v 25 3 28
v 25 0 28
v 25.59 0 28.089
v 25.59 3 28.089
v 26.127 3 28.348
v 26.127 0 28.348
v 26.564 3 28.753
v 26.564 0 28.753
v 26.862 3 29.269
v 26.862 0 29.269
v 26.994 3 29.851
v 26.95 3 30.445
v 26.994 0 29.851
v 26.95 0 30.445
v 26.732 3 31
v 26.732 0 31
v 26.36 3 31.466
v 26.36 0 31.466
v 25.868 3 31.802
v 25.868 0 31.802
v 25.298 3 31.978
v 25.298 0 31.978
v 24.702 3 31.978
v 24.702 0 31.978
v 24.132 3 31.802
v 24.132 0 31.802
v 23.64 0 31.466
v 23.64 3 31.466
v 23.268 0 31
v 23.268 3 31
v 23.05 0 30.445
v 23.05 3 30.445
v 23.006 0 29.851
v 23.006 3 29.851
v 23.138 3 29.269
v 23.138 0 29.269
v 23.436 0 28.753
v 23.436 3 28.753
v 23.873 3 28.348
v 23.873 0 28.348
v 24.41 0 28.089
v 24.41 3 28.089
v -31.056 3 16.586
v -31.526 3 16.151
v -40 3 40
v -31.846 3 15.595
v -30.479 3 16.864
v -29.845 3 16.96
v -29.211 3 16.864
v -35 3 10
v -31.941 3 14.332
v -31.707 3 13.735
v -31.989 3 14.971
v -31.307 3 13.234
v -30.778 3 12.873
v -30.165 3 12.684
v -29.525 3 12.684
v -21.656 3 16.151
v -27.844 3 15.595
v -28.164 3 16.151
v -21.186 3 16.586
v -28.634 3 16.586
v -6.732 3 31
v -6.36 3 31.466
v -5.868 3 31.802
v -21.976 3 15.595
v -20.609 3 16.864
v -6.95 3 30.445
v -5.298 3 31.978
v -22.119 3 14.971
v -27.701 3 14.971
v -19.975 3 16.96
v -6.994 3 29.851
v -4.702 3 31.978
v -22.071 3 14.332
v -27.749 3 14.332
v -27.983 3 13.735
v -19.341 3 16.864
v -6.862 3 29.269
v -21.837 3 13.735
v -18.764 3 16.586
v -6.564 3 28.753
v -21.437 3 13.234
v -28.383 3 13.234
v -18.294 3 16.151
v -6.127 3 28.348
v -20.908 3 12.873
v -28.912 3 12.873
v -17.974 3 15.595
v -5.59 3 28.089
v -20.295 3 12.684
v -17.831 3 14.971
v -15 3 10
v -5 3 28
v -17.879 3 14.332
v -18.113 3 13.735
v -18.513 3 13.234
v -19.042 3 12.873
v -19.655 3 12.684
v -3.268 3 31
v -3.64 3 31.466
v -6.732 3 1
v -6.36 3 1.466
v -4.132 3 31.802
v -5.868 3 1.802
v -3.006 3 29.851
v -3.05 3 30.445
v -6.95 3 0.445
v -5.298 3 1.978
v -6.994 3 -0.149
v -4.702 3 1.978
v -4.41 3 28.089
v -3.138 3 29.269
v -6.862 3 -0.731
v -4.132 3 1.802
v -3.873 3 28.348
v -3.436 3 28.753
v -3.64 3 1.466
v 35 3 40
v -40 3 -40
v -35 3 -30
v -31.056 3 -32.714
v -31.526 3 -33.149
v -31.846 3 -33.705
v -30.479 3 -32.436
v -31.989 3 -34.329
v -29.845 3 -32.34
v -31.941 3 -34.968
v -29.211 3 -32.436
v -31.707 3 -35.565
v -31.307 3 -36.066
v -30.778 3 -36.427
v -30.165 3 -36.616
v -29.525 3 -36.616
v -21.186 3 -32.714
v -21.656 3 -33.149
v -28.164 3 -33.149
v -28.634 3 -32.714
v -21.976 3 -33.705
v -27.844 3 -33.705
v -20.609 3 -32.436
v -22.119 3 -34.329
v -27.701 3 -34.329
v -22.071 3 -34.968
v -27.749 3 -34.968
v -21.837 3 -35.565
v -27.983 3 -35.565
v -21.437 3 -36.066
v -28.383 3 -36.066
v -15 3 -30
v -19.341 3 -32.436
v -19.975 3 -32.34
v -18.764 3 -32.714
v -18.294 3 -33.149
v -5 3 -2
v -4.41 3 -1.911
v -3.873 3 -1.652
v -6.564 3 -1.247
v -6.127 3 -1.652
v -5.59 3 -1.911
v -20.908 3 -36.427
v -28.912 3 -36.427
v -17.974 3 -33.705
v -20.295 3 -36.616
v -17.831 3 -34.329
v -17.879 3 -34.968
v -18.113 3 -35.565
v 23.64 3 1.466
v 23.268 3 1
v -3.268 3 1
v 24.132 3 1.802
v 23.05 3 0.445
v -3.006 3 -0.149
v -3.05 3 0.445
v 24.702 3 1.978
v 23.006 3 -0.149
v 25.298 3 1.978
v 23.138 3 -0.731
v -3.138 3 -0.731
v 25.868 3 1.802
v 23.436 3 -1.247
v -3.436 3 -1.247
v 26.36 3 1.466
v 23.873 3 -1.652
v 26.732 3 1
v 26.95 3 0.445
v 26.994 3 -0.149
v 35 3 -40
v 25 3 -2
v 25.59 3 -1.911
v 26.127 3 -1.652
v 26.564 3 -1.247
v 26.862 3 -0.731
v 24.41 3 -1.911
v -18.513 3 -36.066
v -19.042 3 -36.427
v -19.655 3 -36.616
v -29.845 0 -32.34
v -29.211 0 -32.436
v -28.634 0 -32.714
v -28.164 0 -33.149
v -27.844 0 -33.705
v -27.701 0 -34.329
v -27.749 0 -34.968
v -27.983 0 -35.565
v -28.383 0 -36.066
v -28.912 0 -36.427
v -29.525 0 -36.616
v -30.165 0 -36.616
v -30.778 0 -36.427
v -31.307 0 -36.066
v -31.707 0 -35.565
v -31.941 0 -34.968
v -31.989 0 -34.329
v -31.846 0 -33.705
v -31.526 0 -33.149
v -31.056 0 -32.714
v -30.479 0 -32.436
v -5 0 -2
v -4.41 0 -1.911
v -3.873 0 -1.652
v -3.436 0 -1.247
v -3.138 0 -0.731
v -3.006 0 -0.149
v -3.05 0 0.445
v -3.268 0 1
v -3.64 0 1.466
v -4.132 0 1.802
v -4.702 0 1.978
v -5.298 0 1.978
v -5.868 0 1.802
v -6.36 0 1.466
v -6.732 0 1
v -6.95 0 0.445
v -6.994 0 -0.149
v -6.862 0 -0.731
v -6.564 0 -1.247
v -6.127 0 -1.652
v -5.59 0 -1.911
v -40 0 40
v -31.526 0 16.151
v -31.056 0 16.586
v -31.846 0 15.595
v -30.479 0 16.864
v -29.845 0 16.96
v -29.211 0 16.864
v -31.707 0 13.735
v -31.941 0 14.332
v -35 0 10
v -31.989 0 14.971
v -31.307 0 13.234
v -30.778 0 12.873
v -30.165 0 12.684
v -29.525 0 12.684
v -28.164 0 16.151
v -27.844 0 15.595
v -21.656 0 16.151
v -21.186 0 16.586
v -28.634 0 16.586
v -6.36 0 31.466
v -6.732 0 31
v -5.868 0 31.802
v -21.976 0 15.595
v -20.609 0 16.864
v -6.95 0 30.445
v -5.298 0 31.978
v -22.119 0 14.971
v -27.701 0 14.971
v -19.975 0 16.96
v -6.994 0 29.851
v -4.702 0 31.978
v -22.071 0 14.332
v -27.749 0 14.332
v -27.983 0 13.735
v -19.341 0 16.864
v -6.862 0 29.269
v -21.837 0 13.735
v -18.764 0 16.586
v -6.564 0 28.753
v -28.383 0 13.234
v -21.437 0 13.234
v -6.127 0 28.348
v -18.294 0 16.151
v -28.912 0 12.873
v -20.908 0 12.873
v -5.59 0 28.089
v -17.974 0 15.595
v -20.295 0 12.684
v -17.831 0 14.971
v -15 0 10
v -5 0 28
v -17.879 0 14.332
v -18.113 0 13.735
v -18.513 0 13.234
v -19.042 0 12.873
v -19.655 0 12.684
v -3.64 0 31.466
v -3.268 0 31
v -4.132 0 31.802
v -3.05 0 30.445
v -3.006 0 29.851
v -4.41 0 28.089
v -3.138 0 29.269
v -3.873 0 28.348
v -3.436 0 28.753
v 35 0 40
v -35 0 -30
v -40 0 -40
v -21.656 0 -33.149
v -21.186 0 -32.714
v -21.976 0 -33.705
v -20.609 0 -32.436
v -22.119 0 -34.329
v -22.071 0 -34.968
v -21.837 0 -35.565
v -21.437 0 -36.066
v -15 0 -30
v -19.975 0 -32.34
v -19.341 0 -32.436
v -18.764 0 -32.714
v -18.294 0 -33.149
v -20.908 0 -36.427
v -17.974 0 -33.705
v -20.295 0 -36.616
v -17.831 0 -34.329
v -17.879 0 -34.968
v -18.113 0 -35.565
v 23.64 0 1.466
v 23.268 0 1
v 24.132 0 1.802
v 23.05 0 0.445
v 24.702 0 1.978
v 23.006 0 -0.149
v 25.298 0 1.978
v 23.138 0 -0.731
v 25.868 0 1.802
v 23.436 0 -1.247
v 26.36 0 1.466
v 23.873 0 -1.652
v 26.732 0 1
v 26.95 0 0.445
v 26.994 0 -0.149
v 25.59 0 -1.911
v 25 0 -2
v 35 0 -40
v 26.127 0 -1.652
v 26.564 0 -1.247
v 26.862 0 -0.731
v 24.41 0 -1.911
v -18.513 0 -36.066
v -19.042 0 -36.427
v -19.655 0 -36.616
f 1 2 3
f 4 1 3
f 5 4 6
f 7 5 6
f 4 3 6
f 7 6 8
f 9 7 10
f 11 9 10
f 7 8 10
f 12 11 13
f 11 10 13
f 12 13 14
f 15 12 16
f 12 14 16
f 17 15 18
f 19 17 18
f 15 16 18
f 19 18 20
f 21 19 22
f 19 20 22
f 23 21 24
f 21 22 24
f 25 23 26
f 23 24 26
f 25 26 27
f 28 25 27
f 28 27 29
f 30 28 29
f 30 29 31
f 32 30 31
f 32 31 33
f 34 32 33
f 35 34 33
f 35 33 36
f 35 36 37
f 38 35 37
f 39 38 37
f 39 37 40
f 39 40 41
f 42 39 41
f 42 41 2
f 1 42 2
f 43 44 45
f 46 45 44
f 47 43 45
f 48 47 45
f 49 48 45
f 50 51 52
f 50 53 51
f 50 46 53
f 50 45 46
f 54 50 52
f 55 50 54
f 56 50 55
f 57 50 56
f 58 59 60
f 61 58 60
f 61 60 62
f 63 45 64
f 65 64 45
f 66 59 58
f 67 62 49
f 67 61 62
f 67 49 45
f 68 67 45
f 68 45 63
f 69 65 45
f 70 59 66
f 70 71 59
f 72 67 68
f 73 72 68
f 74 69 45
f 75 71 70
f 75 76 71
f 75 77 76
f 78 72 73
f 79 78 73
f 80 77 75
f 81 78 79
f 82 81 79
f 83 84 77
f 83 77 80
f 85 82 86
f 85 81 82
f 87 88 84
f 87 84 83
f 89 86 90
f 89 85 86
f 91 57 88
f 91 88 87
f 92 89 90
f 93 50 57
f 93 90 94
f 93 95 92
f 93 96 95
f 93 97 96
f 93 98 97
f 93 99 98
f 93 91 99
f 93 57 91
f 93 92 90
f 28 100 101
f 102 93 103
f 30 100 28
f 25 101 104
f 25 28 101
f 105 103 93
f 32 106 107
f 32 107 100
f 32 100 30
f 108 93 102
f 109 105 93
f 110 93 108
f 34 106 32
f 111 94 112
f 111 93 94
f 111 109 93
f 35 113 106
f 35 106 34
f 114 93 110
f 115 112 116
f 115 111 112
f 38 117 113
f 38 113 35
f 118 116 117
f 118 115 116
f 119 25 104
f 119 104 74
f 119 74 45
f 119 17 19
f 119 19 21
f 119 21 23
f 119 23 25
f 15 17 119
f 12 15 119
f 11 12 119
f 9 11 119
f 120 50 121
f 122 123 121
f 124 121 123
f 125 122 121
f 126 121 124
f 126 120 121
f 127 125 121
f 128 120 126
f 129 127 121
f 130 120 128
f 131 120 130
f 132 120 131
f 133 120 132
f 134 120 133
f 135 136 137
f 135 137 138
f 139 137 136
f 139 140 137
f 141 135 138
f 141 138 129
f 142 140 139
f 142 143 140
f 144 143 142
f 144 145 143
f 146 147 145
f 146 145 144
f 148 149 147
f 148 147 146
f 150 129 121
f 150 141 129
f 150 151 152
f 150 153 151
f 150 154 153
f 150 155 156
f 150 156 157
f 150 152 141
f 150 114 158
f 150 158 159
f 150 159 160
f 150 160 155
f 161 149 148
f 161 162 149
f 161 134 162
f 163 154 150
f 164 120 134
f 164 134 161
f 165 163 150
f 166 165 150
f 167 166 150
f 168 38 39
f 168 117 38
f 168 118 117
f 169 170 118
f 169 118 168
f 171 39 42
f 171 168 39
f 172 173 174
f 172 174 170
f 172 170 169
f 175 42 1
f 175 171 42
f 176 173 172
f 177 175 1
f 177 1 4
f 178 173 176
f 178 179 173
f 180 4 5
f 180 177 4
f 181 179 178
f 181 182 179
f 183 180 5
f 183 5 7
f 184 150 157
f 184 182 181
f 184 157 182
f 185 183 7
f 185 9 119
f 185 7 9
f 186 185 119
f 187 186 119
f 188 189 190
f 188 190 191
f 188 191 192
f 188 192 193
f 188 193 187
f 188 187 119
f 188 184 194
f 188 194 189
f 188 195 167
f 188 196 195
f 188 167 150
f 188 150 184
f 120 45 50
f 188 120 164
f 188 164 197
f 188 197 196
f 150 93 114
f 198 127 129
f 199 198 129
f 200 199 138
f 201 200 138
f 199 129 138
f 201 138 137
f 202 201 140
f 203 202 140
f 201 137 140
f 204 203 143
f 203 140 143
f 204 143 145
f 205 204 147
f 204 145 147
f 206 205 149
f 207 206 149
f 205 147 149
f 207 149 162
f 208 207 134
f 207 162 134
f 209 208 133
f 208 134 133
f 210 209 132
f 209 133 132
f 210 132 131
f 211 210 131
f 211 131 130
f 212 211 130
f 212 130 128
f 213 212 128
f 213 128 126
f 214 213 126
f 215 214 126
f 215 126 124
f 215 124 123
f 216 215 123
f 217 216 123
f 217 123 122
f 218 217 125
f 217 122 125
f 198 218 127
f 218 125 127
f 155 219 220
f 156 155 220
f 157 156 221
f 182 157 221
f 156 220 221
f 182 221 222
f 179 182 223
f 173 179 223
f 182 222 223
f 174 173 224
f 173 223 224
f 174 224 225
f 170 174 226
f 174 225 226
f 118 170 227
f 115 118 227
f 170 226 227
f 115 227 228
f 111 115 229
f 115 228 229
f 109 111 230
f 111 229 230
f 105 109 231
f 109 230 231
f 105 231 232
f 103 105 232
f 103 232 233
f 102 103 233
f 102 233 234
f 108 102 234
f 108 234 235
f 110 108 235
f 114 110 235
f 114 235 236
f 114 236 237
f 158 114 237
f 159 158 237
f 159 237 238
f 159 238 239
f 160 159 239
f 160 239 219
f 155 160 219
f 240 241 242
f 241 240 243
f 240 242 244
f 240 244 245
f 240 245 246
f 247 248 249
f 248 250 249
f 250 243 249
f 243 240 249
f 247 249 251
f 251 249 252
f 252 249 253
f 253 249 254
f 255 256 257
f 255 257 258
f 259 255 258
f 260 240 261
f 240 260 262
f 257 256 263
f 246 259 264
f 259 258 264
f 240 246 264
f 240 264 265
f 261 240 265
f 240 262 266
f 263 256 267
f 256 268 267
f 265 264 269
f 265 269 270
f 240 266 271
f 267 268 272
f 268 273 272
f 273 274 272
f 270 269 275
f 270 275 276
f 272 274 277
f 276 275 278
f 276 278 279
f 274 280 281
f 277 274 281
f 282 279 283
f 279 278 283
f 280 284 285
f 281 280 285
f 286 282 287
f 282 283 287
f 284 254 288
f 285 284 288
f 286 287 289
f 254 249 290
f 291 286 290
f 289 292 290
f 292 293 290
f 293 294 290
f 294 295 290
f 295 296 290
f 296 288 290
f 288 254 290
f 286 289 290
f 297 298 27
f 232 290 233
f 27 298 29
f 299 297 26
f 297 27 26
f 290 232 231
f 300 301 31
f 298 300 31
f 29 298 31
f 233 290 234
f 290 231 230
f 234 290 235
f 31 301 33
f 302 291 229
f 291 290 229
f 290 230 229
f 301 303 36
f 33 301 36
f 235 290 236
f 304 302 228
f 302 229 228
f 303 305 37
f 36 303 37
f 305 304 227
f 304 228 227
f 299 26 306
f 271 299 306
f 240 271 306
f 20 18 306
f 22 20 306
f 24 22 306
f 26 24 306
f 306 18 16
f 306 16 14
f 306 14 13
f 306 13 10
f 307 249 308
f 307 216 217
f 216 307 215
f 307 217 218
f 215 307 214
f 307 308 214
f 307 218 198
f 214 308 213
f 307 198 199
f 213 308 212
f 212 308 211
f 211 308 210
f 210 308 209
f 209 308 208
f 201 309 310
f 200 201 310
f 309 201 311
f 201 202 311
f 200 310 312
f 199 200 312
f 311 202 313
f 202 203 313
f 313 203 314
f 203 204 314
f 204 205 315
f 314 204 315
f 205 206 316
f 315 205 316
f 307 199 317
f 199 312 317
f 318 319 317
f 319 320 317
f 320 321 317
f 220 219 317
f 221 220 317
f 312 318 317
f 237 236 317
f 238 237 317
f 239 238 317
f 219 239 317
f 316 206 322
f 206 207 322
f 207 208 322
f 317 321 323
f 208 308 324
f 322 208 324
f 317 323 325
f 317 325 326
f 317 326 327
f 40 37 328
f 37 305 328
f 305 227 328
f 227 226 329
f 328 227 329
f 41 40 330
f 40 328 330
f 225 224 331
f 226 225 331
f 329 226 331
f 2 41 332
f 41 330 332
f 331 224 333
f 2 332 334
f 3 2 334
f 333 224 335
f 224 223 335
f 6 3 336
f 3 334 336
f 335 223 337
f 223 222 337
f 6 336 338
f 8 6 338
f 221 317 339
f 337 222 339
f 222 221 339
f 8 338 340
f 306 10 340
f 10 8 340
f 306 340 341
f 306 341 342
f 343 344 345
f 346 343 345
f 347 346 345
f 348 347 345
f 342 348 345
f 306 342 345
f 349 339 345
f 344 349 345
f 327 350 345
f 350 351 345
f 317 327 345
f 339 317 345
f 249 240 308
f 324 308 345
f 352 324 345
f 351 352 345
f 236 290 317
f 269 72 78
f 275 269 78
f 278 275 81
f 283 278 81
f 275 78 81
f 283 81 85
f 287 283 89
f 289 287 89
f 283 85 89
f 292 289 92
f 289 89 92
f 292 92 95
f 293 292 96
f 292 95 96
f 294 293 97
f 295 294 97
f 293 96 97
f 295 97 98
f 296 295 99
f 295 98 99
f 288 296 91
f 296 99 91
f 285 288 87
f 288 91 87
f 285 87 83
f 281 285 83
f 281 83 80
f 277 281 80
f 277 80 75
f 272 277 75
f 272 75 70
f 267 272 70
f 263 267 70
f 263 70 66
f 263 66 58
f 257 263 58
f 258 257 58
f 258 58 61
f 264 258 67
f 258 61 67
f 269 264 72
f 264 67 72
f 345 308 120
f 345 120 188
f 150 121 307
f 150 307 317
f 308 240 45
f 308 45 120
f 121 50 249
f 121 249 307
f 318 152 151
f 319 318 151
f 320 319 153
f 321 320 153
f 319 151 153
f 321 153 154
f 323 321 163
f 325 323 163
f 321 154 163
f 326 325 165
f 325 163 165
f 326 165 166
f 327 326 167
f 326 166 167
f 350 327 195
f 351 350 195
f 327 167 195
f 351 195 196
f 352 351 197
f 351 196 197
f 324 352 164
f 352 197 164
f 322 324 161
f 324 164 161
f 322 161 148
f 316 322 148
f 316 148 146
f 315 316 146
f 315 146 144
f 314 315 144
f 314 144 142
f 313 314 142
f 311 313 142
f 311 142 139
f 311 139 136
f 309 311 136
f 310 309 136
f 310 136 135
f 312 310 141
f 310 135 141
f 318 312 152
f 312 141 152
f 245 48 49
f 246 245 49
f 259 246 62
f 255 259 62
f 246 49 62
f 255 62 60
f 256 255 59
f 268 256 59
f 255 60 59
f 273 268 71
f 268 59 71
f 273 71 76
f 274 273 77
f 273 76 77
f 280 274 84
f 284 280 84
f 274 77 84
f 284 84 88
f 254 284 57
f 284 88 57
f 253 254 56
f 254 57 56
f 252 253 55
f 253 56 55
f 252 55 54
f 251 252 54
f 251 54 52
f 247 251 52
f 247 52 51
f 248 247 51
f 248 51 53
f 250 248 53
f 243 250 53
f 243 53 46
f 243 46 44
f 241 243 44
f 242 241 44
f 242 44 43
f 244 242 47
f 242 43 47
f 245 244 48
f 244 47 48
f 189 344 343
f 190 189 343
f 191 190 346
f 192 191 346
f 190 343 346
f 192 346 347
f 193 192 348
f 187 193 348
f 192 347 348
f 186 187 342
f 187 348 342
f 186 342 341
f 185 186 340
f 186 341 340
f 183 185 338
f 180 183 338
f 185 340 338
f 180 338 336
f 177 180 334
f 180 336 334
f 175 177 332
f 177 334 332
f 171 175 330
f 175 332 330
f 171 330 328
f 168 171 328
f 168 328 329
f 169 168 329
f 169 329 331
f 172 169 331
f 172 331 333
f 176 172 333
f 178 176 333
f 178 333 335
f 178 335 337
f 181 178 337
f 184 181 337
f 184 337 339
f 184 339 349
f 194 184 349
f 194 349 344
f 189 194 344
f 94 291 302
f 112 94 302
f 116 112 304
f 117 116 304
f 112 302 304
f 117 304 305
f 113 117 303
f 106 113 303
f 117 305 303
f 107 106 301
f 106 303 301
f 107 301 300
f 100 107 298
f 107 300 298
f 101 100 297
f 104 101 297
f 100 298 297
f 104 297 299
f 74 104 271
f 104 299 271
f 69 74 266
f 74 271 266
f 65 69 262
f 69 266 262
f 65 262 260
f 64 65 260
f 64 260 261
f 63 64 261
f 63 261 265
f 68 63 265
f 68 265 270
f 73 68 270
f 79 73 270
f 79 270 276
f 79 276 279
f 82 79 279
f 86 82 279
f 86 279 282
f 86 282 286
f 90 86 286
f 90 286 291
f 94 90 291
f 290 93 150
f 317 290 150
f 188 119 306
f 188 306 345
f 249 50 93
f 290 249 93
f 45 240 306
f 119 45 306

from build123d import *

# Parameters (mm, degrees)
SKETCH2_W           = 80
SKETCH2_H           = 80
BOSS_EXTRUDE1_DEPTH = 3
SKETCH3_R           = 2.15
SKETCH3_W           = 20
SKETCH3_H           = 40
CUT_EXTRUDE1_DEPTH  = 3
SKETCH4_W           = 5
SKETCH4_H           = 80
CUT_EXTRUDE2_DEPTH  = 10
SKETCH5_R           = 2
CUT_EXTRUDE3_DEPTH  = 10


with BuildPart() as part:
    # Sketch2 → Boss-Extrude1 (new body)
    with BuildSketch(Plane(origin=(0, 0, 0), x_dir=(1, 0, 0), z_dir=(0, 1, 0))):
        Rectangle(SKETCH2_W, SKETCH2_H)
    extrude(amount=BOSS_EXTRUDE1_DEPTH)

    # Sketch3 → Cut-Extrude1 (cut)
    with BuildSketch(Plane(origin=(0, 3, 0), x_dir=(1, 0, 0), z_dir=(0, 1, 0))):
        with Locations(Location((-29.845, 34.49, 0), (0, 0, 270))):
            Circle(SKETCH3_R)
        with Locations(Location((-19.975, 34.49, 0), (0, 0, 270))):
            Circle(SKETCH3_R)
        with Locations(Location((-19.975, -14.81, 0), (0, 0, 270))):
            Circle(SKETCH3_R)
        with Locations(Location((-29.845, -14.81, 0), (0, 0, 270))):
            Circle(SKETCH3_R)
        with Locations((-25, 10)):
            Rectangle(SKETCH3_W, SKETCH3_H)
    extrude(amount=-CUT_EXTRUDE1_DEPTH, mode=Mode.SUBTRACT)

    # Sketch4 → Cut-Extrude2 (cut)
    with BuildSketch(Plane(origin=(0, 3, 0), x_dir=(1, 0, 0), z_dir=(0, 1, 0))):
        with Locations((37.5, 0)):
            Rectangle(SKETCH4_W, SKETCH4_H)
    extrude(amount=-CUT_EXTRUDE2_DEPTH, mode=Mode.SUBTRACT)

    # Sketch5 → Cut-Extrude3 (cut)
    with BuildSketch(Plane.XZ):
        with Locations(Location((25, 0, 0), (0, 0, 270))):
            Circle(SKETCH5_R)
        with Locations(Location((-5, 0, 0), (0, 0, 270))):
            Circle(SKETCH5_R)
        with Locations(Location((-5, 30, 0), (0, 0, 270))):
            Circle(SKETCH5_R)
        with Locations(Location((25, 30, 0), (0, 0, 270))):
            Circle(SKETCH5_R)
    extrude(amount=-CUT_EXTRUDE3_DEPTH, mode=Mode.SUBTRACT)


solid = part.part
